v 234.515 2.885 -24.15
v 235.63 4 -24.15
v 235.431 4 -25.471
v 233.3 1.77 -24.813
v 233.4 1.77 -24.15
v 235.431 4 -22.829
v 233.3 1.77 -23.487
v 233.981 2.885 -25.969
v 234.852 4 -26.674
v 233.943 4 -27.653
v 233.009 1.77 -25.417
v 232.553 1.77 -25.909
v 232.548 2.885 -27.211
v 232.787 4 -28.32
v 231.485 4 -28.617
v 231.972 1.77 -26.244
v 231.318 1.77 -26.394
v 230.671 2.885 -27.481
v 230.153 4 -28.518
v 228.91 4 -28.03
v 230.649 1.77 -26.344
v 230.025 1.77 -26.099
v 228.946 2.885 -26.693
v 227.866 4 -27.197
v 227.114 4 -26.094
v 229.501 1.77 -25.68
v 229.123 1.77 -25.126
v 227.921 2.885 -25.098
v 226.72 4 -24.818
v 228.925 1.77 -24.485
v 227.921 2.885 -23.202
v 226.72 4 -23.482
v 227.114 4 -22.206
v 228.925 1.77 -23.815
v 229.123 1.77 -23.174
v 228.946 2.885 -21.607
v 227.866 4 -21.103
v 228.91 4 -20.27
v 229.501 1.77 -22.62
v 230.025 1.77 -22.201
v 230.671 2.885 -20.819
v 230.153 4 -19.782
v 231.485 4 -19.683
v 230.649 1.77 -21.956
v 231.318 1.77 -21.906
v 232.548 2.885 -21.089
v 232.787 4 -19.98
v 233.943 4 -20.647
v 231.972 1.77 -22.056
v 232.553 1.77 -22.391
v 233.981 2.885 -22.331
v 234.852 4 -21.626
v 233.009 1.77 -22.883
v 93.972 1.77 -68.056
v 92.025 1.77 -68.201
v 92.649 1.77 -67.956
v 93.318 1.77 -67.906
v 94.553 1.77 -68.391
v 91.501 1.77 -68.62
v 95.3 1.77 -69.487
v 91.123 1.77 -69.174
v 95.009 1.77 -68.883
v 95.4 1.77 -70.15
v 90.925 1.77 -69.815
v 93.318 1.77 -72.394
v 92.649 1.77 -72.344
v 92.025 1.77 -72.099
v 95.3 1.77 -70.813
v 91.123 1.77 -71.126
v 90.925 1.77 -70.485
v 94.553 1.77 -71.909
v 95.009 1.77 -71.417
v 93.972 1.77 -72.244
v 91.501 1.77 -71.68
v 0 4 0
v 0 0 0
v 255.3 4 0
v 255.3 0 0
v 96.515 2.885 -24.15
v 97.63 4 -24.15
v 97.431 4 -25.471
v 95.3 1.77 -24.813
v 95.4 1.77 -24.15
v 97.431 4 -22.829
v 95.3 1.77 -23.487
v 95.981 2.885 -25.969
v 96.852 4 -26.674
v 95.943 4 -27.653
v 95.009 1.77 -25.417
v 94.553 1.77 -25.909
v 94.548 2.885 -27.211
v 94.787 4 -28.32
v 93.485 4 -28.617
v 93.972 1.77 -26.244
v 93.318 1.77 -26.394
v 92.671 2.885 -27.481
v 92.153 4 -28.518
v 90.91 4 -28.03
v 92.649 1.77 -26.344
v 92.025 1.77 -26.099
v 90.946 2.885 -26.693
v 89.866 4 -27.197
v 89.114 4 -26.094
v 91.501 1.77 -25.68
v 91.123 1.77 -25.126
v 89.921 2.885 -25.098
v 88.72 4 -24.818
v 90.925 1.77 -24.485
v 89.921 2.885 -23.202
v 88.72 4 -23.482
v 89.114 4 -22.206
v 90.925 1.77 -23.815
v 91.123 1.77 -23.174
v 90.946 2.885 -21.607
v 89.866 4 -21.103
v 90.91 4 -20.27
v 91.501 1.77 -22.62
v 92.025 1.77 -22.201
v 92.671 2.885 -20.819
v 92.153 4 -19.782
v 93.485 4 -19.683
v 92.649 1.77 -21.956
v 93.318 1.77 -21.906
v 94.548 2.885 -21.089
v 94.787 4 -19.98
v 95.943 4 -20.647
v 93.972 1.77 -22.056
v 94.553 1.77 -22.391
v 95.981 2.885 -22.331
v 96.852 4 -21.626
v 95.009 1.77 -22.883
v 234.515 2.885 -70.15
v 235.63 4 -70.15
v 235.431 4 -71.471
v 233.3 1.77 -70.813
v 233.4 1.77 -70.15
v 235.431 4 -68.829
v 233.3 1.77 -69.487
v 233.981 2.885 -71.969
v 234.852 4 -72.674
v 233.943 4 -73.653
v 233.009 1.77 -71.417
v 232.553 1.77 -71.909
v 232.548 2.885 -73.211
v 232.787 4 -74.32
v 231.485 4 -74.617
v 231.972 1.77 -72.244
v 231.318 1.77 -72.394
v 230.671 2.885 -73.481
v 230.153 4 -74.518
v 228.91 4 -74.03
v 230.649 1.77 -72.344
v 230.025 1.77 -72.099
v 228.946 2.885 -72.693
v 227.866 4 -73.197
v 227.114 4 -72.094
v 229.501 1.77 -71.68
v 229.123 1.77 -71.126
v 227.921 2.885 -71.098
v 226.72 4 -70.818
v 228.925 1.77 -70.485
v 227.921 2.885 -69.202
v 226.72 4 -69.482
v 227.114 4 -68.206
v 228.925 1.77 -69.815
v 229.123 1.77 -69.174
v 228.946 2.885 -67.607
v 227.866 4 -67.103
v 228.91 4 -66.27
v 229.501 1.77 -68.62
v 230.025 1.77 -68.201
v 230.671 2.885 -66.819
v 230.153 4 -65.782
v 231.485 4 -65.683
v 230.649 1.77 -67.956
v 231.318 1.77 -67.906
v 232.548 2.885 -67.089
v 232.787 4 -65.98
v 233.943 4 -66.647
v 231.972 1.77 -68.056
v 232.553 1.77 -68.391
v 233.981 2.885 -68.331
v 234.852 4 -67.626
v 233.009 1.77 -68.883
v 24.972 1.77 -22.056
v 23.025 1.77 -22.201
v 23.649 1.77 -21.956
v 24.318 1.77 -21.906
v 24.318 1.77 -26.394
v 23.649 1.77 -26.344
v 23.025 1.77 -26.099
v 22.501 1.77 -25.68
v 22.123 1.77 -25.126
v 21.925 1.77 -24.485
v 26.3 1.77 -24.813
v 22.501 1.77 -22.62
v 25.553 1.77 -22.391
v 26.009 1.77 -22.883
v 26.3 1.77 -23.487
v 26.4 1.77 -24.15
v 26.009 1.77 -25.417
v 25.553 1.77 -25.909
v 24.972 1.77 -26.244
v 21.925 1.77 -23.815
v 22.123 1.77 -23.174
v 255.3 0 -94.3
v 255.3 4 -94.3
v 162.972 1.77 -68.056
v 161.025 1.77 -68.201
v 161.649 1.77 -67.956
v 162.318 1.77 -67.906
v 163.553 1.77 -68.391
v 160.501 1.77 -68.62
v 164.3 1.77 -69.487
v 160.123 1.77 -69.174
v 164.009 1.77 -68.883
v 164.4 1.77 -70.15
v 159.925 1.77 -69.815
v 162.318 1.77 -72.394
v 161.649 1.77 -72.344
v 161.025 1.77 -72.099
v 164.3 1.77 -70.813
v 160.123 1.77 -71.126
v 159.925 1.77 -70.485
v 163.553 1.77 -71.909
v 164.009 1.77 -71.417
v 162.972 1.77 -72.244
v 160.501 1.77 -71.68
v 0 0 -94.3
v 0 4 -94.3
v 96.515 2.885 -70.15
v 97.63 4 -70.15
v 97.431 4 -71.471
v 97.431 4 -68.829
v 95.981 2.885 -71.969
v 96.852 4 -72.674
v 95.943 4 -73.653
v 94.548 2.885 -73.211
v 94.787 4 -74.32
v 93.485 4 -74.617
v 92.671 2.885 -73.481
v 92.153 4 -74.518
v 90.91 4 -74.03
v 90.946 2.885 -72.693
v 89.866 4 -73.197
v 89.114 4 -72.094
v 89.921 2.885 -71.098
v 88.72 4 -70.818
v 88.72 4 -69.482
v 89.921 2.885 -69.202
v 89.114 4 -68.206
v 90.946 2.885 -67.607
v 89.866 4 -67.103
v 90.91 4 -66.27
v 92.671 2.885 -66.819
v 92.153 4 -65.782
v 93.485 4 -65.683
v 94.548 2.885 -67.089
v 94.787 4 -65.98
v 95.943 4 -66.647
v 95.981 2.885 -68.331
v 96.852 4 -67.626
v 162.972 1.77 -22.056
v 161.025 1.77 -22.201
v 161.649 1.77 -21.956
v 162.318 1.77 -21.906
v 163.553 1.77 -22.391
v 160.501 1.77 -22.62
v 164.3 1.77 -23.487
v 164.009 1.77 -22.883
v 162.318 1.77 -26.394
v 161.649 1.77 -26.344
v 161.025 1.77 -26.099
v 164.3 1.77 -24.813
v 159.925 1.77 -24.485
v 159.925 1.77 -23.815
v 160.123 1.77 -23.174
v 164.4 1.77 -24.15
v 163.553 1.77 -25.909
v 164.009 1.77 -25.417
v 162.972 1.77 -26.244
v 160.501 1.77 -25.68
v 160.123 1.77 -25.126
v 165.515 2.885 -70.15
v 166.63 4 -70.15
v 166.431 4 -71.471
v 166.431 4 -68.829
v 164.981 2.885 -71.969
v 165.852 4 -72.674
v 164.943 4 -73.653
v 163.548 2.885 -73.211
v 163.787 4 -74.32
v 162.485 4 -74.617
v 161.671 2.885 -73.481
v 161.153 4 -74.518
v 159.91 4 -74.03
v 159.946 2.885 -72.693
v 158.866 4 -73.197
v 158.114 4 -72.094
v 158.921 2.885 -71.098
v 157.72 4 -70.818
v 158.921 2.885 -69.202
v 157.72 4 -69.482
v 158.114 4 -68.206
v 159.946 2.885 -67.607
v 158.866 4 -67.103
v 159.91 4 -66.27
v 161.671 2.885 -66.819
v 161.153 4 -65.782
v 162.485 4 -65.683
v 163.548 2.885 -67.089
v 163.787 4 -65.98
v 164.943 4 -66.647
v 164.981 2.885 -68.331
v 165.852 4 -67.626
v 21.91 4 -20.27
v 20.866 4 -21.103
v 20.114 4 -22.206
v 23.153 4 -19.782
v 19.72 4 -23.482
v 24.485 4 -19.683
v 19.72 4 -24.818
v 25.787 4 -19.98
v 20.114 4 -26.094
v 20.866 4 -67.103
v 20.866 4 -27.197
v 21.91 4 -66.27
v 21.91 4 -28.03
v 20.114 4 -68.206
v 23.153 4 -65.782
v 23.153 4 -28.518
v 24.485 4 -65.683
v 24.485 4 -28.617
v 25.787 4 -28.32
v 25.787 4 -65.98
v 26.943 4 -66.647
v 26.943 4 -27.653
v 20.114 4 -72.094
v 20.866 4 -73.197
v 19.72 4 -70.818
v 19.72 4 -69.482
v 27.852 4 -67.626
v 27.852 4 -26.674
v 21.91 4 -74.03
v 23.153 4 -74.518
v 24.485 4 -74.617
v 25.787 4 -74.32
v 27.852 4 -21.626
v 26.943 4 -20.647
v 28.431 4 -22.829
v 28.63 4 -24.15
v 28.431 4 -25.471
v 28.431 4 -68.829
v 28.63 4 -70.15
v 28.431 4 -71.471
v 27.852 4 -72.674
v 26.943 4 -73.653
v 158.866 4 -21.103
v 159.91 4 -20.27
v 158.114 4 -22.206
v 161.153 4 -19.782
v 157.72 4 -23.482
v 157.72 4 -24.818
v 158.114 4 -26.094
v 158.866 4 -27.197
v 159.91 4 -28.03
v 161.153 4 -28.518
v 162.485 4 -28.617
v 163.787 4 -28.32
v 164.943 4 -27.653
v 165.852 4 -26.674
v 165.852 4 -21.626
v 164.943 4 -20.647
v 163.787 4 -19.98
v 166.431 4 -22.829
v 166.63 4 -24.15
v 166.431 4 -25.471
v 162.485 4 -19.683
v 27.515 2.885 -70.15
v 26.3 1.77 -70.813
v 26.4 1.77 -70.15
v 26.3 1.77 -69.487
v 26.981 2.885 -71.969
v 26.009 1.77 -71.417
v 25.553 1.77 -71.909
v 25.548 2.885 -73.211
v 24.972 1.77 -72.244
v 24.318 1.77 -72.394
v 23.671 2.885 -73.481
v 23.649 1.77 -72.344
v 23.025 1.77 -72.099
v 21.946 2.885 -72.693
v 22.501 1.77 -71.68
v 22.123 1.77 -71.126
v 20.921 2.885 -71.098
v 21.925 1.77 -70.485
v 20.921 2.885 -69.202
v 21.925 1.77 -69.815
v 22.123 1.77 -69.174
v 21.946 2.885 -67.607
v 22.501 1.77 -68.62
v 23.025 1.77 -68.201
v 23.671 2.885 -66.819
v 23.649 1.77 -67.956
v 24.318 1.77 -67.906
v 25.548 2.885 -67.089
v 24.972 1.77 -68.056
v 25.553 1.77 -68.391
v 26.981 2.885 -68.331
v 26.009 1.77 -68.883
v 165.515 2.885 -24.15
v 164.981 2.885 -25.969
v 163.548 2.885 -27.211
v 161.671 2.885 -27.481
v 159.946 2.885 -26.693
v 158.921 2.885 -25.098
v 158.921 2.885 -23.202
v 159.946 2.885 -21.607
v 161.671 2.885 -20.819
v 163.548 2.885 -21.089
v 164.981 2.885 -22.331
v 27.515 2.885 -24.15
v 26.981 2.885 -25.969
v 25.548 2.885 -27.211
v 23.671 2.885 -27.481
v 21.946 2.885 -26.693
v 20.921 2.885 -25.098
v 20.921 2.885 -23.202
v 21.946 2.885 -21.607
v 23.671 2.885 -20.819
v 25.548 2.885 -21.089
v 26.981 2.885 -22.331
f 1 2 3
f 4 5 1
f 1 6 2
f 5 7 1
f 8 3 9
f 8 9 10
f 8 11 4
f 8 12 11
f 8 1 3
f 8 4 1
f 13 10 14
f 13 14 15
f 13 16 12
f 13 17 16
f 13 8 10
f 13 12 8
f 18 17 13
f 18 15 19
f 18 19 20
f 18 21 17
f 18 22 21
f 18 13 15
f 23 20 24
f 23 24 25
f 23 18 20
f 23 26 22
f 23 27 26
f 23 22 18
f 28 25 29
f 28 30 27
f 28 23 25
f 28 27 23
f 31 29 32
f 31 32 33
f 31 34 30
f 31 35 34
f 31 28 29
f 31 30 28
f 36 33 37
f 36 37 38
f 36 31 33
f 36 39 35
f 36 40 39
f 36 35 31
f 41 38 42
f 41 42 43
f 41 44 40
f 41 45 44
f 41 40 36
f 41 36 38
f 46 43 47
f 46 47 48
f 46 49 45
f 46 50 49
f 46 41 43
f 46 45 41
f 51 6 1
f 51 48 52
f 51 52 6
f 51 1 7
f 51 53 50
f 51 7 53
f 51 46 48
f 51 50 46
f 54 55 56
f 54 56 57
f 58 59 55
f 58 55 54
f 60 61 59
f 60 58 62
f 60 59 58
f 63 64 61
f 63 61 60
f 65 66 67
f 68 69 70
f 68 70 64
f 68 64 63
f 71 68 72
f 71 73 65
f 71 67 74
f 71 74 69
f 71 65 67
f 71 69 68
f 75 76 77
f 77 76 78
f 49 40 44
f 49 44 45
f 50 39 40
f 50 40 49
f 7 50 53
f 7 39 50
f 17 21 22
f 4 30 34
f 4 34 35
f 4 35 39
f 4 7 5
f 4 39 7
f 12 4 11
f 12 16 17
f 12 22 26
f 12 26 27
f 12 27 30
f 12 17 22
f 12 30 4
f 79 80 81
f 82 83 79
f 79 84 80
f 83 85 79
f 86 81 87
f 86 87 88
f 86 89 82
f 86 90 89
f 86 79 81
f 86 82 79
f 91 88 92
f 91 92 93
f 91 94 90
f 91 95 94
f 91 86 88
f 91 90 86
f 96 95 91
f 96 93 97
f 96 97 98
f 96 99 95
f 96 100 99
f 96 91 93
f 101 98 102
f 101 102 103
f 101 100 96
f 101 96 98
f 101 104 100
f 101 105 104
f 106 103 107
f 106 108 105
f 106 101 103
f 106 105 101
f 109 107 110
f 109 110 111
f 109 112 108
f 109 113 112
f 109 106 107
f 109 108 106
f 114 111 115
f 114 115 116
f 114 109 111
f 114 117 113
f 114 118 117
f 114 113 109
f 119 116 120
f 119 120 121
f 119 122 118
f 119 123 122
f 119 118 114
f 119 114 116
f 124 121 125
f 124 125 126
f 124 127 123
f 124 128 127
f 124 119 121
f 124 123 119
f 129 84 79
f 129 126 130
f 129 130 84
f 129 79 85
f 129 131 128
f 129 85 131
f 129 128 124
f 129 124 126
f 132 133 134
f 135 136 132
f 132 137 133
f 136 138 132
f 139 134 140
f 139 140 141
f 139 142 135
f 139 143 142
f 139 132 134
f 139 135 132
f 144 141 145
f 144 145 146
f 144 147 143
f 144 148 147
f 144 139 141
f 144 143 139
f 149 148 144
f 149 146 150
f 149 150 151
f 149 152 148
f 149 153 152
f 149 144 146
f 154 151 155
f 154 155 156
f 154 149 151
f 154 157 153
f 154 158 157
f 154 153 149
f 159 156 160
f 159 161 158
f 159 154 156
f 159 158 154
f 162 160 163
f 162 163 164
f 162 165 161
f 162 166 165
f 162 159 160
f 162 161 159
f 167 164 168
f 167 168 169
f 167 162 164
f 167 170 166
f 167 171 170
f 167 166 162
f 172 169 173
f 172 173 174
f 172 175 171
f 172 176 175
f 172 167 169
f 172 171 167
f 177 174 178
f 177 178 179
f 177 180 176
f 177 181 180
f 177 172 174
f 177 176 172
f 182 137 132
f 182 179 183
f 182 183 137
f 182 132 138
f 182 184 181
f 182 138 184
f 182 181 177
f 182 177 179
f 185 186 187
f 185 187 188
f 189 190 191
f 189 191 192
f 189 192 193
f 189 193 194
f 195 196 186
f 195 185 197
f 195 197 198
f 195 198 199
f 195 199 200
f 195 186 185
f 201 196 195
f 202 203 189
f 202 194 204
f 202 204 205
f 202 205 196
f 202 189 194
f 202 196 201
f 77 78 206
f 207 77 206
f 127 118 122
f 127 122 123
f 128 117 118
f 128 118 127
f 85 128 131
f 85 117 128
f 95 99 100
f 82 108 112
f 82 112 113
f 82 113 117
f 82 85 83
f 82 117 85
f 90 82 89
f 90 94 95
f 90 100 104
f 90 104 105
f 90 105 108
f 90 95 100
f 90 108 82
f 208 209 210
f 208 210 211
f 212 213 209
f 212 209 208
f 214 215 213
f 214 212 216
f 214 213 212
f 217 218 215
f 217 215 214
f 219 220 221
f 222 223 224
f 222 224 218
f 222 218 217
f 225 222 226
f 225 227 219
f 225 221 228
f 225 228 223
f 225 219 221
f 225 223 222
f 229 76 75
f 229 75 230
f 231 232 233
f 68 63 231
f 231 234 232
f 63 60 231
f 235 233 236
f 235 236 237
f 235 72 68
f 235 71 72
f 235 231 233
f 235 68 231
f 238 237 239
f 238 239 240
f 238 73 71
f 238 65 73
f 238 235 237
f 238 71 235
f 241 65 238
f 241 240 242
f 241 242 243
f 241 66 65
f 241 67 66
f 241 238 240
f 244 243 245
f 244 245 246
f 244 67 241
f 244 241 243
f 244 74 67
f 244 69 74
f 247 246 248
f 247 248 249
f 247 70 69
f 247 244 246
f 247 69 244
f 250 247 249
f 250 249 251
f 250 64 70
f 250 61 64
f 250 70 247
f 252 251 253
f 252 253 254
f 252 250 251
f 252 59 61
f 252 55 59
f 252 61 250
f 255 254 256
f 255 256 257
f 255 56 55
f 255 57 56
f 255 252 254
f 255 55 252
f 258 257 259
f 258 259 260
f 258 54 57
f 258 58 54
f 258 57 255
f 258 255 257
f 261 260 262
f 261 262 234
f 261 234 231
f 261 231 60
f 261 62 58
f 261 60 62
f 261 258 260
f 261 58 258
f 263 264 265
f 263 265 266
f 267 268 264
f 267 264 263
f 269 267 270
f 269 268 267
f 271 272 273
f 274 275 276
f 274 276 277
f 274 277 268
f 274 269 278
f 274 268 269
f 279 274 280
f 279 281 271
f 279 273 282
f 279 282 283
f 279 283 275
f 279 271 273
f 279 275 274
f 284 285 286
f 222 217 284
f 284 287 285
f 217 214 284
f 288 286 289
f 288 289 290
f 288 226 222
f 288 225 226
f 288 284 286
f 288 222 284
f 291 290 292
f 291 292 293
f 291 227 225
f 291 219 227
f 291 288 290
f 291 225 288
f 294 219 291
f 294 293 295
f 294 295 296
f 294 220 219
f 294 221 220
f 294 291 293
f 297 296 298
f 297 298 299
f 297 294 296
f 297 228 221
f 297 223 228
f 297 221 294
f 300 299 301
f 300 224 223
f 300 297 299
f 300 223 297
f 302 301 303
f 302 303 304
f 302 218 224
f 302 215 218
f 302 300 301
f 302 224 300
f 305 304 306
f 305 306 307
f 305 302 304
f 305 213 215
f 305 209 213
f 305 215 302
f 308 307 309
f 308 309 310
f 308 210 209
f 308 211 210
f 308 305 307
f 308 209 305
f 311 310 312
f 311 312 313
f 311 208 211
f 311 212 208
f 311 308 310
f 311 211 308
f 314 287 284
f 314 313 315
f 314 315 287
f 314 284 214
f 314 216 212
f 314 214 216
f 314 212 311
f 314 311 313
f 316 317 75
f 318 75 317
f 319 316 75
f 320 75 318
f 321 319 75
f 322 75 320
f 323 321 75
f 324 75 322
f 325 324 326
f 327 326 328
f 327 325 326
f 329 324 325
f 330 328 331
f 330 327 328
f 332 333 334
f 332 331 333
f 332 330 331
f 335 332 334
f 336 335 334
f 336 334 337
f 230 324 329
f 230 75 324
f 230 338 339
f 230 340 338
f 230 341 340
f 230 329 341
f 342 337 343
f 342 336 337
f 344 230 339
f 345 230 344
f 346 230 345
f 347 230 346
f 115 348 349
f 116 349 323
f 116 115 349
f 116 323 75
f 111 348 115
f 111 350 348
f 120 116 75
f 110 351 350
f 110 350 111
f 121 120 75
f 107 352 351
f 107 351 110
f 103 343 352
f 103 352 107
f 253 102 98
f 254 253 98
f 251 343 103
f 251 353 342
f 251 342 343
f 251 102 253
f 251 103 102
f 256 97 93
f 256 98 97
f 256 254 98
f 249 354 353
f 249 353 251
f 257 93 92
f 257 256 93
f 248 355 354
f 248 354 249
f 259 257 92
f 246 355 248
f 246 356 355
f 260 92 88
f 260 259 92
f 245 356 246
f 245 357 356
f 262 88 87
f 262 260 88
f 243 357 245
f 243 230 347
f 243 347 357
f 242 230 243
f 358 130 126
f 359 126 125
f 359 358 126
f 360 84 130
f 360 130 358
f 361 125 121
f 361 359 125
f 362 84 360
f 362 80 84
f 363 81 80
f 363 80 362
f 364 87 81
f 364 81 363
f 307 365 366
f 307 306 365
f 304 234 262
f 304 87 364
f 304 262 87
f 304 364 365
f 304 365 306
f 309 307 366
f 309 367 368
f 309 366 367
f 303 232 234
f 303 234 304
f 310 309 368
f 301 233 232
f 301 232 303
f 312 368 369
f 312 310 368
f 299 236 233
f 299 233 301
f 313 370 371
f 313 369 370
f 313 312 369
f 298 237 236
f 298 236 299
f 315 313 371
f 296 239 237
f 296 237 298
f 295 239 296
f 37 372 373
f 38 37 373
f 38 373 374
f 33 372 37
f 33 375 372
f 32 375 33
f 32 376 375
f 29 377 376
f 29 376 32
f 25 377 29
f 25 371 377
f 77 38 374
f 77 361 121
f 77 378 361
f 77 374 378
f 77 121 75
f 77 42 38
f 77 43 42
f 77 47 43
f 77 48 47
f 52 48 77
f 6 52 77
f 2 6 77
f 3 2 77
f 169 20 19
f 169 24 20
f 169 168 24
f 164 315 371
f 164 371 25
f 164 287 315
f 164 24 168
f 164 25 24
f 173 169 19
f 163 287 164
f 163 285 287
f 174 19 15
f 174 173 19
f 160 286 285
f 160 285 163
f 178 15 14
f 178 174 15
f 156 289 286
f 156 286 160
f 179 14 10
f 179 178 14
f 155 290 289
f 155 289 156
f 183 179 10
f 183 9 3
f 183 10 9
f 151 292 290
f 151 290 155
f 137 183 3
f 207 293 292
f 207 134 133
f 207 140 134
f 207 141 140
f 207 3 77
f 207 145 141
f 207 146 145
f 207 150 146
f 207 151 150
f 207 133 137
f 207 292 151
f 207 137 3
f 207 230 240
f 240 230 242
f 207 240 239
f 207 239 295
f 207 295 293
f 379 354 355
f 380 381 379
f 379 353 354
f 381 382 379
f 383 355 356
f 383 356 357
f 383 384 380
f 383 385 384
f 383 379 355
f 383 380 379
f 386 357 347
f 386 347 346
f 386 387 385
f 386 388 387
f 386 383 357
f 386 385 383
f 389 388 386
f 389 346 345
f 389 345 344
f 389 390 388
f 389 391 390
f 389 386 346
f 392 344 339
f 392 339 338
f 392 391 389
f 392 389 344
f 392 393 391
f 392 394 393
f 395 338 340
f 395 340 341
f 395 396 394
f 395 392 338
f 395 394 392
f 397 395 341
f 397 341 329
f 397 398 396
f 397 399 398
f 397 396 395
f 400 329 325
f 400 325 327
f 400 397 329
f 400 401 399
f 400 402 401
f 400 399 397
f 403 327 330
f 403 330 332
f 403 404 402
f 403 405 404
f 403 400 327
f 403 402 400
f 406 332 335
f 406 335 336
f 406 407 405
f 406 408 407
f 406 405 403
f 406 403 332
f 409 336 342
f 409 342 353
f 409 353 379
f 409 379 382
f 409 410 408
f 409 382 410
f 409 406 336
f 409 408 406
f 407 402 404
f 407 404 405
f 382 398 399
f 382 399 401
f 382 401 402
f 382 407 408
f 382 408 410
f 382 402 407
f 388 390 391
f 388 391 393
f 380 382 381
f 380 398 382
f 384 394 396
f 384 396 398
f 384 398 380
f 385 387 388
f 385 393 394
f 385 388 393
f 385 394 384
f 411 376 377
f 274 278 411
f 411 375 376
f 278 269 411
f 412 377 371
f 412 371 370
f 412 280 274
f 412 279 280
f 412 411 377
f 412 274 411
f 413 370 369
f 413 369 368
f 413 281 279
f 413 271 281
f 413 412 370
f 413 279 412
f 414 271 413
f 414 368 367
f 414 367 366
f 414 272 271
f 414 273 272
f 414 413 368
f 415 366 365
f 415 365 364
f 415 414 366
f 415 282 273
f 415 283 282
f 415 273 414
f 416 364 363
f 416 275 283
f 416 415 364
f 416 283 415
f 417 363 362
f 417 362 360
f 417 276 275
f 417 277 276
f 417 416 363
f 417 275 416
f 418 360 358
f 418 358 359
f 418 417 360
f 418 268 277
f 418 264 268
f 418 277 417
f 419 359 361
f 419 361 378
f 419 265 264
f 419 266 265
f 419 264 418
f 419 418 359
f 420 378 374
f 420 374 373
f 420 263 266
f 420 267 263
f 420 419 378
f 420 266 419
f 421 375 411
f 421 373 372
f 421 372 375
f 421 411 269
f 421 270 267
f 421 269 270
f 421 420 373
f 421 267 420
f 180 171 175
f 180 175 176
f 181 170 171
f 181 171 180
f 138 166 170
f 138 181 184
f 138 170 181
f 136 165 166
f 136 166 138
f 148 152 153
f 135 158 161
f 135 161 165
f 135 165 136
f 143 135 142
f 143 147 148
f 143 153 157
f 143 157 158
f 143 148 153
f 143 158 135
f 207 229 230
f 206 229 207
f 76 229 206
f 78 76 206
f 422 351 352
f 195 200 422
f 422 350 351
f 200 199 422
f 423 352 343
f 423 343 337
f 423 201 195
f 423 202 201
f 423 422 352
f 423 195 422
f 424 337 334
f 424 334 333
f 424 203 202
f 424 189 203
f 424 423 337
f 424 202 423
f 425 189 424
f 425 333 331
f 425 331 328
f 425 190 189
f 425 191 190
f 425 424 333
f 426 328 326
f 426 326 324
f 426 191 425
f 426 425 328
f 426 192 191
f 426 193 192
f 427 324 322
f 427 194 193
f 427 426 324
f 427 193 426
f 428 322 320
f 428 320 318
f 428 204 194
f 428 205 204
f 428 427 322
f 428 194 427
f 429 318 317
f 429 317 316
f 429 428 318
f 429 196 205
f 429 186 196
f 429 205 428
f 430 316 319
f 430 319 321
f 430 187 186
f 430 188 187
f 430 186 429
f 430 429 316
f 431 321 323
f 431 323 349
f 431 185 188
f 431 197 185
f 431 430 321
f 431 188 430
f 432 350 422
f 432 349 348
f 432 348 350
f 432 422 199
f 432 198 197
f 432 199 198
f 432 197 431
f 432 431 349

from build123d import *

# Parameters (mm, degrees)
SKETCH1_W                 = 255.3
SKETCH1_H                 = 94.3
BOSS_EXTRUDE1_DEPTH       = 4
ADVANCEDHOLE2_OUTLINE_R   = 2.25
ADVANCEDHOLE2_DEPTH       = 2.23
ADVANCEDHOLE2_DRAFT       = -45
ADVANCEDHOLE2_2_OUTLINE_R = 2.25
ADVANCEDHOLE2_2_DEPTH     = 2.23
ADVANCEDHOLE2_2_DRAFT     = -45
ADVANCEDHOLE2_3_OUTLINE_R = 2.25
ADVANCEDHOLE2_3_DEPTH     = 2.23
ADVANCEDHOLE2_3_DRAFT     = -45
ADVANCEDHOLE2_4_OUTLINE_R = 2.25
ADVANCEDHOLE2_4_DEPTH     = 2.23
ADVANCEDHOLE2_4_DRAFT     = -45
ADVANCEDHOLE2_5_OUTLINE_R = 2.25
ADVANCEDHOLE2_5_DEPTH     = 2.23
ADVANCEDHOLE2_5_DRAFT     = -45
ADVANCEDHOLE2_6_OUTLINE_R = 2.25
ADVANCEDHOLE2_6_DEPTH     = 2.23
ADVANCEDHOLE2_6_DRAFT     = -45
ADVANCEDHOLE2_7_OUTLINE_R = 2.25
ADVANCEDHOLE2_7_DEPTH     = 2.23
ADVANCEDHOLE2_7_DRAFT     = -45
ADVANCEDHOLE2_8_OUTLINE_R = 2.25
ADVANCEDHOLE2_8_DEPTH     = 2.23
ADVANCEDHOLE2_8_DRAFT     = -45


# Read off the part's stored shape, not the designer's step: AdvancedHole2
with BuildPart() as part:
    # Sketch1 → Boss-Extrude1 (new body)
    with BuildSketch(Plane(origin=(0, 0, 0), x_dir=(1, 0, 0), z_dir=(0, 1, 0))):
        with Locations((127.65, 47.15)):
            Rectangle(SKETCH1_W, SKETCH1_H)
    extrude(amount=BOSS_EXTRUDE1_DEPTH)


with BuildPart() as advancedhole2_tool:
    # AdvancedHole2 outline → AdvancedHole2 (with draft: the straight prism first)
    with BuildSketch(Plane(origin=(0, 1.77, 0), x_dir=(1, 0, 0), z_dir=(0, 1, 0))):
        with Locations((231.15, 24.15)):
            Circle(ADVANCEDHOLE2_OUTLINE_R)
    extrude(amount=ADVANCEDHOLE2_DEPTH)
    # AdvancedHole2: the draft: its side faces are tilted about the plane it starts from
    advancedhole2_sides = [advancedhole2_tool.faces().sort_by_distance(p)[0] for p in [
        (228.9, 2.885, -24.15),
    ]]
    draft(advancedhole2_sides, Plane(origin=(0, 1.77, 0), x_dir=(1, 0, 0), z_dir=(0, 1, 0)), ADVANCEDHOLE2_DRAFT)


with BuildPart() as part_1:
    add(part.part)

    # AdvancedHole2: cut by advancedhole2_tool
    add(advancedhole2_tool.part, mode=Mode.SUBTRACT)


with BuildPart() as advancedhole2_2_tool:
    # AdvancedHole2 2 outline → AdvancedHole2 2 (with draft: the straight prism first)
    with BuildSketch(Plane(origin=(0, 1.77, 0), x_dir=(1, 0, 0), z_dir=(0, 1, 0))):
        with Locations((231.15, 70.15)):
            Circle(ADVANCEDHOLE2_2_OUTLINE_R)
    extrude(amount=ADVANCEDHOLE2_2_DEPTH)
    # AdvancedHole2 2: the draft: its side faces are tilted about the plane it starts from
    advancedhole2_2_sides = [advancedhole2_2_tool.faces().sort_by_distance(p)[0] for p in [
        (228.9, 2.885, -70.15),
    ]]
    draft(advancedhole2_2_sides, Plane(origin=(0, 1.77, 0), x_dir=(1, 0, 0), z_dir=(0, 1, 0)), ADVANCEDHOLE2_2_DRAFT)


with BuildPart() as part_2:
    add(part_1.part)

    # AdvancedHole2 2: cut by advancedhole2_2_tool
    add(advancedhole2_2_tool.part, mode=Mode.SUBTRACT)


with BuildPart() as advancedhole2_3_tool:
    # AdvancedHole2 3 outline → AdvancedHole2 3 (with draft: the straight prism first)
    with BuildSketch(Plane(origin=(0, 1.77, 0), x_dir=(1, 0, 0), z_dir=(0, 1, 0))):
        with Locations((162.15, 70.15)):
            Circle(ADVANCEDHOLE2_3_OUTLINE_R)
    extrude(amount=ADVANCEDHOLE2_3_DEPTH)
    # AdvancedHole2 3: the draft: its side faces are tilted about the plane it starts from
    advancedhole2_3_sides = [advancedhole2_3_tool.faces().sort_by_distance(p)[0] for p in [
        (159.9, 2.885, -70.15),
    ]]
    draft(advancedhole2_3_sides, Plane(origin=(0, 1.77, 0), x_dir=(1, 0, 0), z_dir=(0, 1, 0)), ADVANCEDHOLE2_3_DRAFT)


with BuildPart() as part_3:
    add(part_2.part)

    # AdvancedHole2 3: cut by advancedhole2_3_tool
    add(advancedhole2_3_tool.part, mode=Mode.SUBTRACT)


with BuildPart() as advancedhole2_4_tool:
    # AdvancedHole2 4 outline → AdvancedHole2 4 (with draft: the straight prism first)
    with BuildSketch(Plane(origin=(0, 1.77, 0), x_dir=(1, 0, 0), z_dir=(0, 1, 0))):
        with Locations((162.15, 24.15)):
            Circle(ADVANCEDHOLE2_4_OUTLINE_R)
    extrude(amount=ADVANCEDHOLE2_4_DEPTH)
    # AdvancedHole2 4: the draft: its side faces are tilted about the plane it starts from
    advancedhole2_4_sides = [advancedhole2_4_tool.faces().sort_by_distance(p)[0] for p in [
        (159.9, 2.885, -24.15),
    ]]
    draft(advancedhole2_4_sides, Plane(origin=(0, 1.77, 0), x_dir=(1, 0, 0), z_dir=(0, 1, 0)), ADVANCEDHOLE2_4_DRAFT)


with BuildPart() as part_4:
    add(part_3.part)

    # AdvancedHole2 4: cut by advancedhole2_4_tool
    add(advancedhole2_4_tool.part, mode=Mode.SUBTRACT)


with BuildPart() as advancedhole2_5_tool:
    # AdvancedHole2 5 outline → AdvancedHole2 5 (with draft: the straight prism first)
    with BuildSketch(Plane(origin=(0, 1.77, 0), x_dir=(1, 0, 0), z_dir=(0, 1, 0))):
        with Locations((93.15, 24.15)):
            Circle(ADVANCEDHOLE2_5_OUTLINE_R)
    extrude(amount=ADVANCEDHOLE2_5_DEPTH)
    # AdvancedHole2 5: the draft: its side faces are tilted about the plane it starts from
    advancedhole2_5_sides = [advancedhole2_5_tool.faces().sort_by_distance(p)[0] for p in [
        (90.9, 2.885, -24.15),
    ]]
    draft(advancedhole2_5_sides, Plane(origin=(0, 1.77, 0), x_dir=(1, 0, 0), z_dir=(0, 1, 0)), ADVANCEDHOLE2_5_DRAFT)


with BuildPart() as part_5:
    add(part_4.part)

    # AdvancedHole2 5: cut by advancedhole2_5_tool
    add(advancedhole2_5_tool.part, mode=Mode.SUBTRACT)


with BuildPart() as advancedhole2_6_tool:
    # AdvancedHole2 6 outline → AdvancedHole2 6 (with draft: the straight prism first)
    with BuildSketch(Plane(origin=(0, 1.77, 0), x_dir=(1, 0, 0), z_dir=(0, 1, 0))):
        with Locations((93.15, 70.15)):
            Circle(ADVANCEDHOLE2_6_OUTLINE_R)
    extrude(amount=ADVANCEDHOLE2_6_DEPTH)
    # AdvancedHole2 6: the draft: its side faces are tilted about the plane it starts from
    advancedhole2_6_sides = [advancedhole2_6_tool.faces().sort_by_distance(p)[0] for p in [
        (90.9, 2.885, -70.15),
    ]]
    draft(advancedhole2_6_sides, Plane(origin=(0, 1.77, 0), x_dir=(1, 0, 0), z_dir=(0, 1, 0)), ADVANCEDHOLE2_6_DRAFT)


with BuildPart() as part_6:
    add(part_5.part)

    # AdvancedHole2 6: cut by advancedhole2_6_tool
    add(advancedhole2_6_tool.part, mode=Mode.SUBTRACT)


with BuildPart() as advancedhole2_7_tool:
    # AdvancedHole2 7 outline → AdvancedHole2 7 (with draft: the straight prism first)
    with BuildSketch(Plane(origin=(0, 1.77, 0), x_dir=(1, 0, 0), z_dir=(0, 1, 0))):
        with Locations((24.15, 24.15)):
            Circle(ADVANCEDHOLE2_7_OUTLINE_R)
    extrude(amount=ADVANCEDHOLE2_7_DEPTH)
    # AdvancedHole2 7: the draft: its side faces are tilted about the plane it starts from
    advancedhole2_7_sides = [advancedhole2_7_tool.faces().sort_by_distance(p)[0] for p in [
        (21.9, 2.885, -24.15),
    ]]
    draft(advancedhole2_7_sides, Plane(origin=(0, 1.77, 0), x_dir=(1, 0, 0), z_dir=(0, 1, 0)), ADVANCEDHOLE2_7_DRAFT)


with BuildPart() as part_7:
    add(part_6.part)

    # AdvancedHole2 7: cut by advancedhole2_7_tool
    add(advancedhole2_7_tool.part, mode=Mode.SUBTRACT)


with BuildPart() as advancedhole2_8_tool:
    # AdvancedHole2 8 outline → AdvancedHole2 8 (with draft: the straight prism first)
    with BuildSketch(Plane(origin=(0, 1.77, 0), x_dir=(1, 0, 0), z_dir=(0, 1, 0))):
        with Locations((24.15, 70.15)):
            Circle(ADVANCEDHOLE2_8_OUTLINE_R)
    extrude(amount=ADVANCEDHOLE2_8_DEPTH)
    # AdvancedHole2 8: the draft: its side faces are tilted about the plane it starts from
    advancedhole2_8_sides = [advancedhole2_8_tool.faces().sort_by_distance(p)[0] for p in [
        (21.9, 2.885, -70.15),
    ]]
    draft(advancedhole2_8_sides, Plane(origin=(0, 1.77, 0), x_dir=(1, 0, 0), z_dir=(0, 1, 0)), ADVANCEDHOLE2_8_DRAFT)


with BuildPart() as part_8:
    add(part_7.part)

    # AdvancedHole2 8: cut by advancedhole2_8_tool
    add(advancedhole2_8_tool.part, mode=Mode.SUBTRACT)


solid = part_8.part
